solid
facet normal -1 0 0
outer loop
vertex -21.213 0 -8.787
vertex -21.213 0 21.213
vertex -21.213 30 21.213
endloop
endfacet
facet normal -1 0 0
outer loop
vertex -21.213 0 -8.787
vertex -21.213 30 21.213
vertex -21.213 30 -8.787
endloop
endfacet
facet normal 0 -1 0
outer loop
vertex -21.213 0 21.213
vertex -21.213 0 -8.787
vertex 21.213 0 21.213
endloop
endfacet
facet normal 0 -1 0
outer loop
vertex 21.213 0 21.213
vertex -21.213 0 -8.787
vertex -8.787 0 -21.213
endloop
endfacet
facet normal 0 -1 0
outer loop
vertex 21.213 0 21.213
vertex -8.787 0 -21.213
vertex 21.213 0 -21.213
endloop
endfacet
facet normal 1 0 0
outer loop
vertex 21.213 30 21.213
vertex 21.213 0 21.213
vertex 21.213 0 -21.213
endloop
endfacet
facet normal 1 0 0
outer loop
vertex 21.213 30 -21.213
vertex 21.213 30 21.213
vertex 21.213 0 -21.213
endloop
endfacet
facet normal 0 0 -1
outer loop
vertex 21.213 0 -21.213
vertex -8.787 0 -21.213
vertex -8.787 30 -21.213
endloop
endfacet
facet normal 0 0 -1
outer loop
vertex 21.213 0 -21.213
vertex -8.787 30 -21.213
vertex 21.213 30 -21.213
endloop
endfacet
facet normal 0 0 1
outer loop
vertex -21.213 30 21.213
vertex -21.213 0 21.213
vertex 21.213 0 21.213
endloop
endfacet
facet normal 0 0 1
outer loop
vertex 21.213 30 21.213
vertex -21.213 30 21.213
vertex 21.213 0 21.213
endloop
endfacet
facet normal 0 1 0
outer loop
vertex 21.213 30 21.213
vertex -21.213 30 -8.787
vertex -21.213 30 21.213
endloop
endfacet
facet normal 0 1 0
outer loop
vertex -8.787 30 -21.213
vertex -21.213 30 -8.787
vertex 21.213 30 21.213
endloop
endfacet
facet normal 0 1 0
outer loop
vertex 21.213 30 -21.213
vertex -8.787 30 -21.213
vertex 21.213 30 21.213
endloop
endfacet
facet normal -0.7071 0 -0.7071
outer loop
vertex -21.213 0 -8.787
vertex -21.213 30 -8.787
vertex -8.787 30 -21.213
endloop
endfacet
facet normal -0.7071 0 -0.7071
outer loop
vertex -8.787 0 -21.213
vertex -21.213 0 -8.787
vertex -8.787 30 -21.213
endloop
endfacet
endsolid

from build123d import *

# Parameters (mm, degrees)
SKETCH6_W           = 42.426406872
SKETCH6_H           = 42.426406872
BOSS_EXTRUDE4_DEPTH = 30
CUT_EXTRUDE2_DEPTH  = 43.426406871


with BuildPart() as part:
    # Sketch6 → Boss-Extrude4 (new body)
    with BuildSketch(Plane(origin=(0, 0, 0), x_dir=(1, 0, 0), z_dir=(0, 1, 0))):
        Rectangle(SKETCH6_W, SKETCH6_H)
    extrude(amount=BOSS_EXTRUDE4_DEPTH)

    # Sketch7 → Cut-Extrude2 (cut, through all)
    with BuildSketch(Plane.XZ):
        Polygon((-21.213203436, -8.786796564), (-8.786796564, -21.213203436), (-21.213203436, -21.213203436), align=None)
    extrude(amount=-CUT_EXTRUDE2_DEPTH, mode=Mode.SUBTRACT)


solid = part.part
